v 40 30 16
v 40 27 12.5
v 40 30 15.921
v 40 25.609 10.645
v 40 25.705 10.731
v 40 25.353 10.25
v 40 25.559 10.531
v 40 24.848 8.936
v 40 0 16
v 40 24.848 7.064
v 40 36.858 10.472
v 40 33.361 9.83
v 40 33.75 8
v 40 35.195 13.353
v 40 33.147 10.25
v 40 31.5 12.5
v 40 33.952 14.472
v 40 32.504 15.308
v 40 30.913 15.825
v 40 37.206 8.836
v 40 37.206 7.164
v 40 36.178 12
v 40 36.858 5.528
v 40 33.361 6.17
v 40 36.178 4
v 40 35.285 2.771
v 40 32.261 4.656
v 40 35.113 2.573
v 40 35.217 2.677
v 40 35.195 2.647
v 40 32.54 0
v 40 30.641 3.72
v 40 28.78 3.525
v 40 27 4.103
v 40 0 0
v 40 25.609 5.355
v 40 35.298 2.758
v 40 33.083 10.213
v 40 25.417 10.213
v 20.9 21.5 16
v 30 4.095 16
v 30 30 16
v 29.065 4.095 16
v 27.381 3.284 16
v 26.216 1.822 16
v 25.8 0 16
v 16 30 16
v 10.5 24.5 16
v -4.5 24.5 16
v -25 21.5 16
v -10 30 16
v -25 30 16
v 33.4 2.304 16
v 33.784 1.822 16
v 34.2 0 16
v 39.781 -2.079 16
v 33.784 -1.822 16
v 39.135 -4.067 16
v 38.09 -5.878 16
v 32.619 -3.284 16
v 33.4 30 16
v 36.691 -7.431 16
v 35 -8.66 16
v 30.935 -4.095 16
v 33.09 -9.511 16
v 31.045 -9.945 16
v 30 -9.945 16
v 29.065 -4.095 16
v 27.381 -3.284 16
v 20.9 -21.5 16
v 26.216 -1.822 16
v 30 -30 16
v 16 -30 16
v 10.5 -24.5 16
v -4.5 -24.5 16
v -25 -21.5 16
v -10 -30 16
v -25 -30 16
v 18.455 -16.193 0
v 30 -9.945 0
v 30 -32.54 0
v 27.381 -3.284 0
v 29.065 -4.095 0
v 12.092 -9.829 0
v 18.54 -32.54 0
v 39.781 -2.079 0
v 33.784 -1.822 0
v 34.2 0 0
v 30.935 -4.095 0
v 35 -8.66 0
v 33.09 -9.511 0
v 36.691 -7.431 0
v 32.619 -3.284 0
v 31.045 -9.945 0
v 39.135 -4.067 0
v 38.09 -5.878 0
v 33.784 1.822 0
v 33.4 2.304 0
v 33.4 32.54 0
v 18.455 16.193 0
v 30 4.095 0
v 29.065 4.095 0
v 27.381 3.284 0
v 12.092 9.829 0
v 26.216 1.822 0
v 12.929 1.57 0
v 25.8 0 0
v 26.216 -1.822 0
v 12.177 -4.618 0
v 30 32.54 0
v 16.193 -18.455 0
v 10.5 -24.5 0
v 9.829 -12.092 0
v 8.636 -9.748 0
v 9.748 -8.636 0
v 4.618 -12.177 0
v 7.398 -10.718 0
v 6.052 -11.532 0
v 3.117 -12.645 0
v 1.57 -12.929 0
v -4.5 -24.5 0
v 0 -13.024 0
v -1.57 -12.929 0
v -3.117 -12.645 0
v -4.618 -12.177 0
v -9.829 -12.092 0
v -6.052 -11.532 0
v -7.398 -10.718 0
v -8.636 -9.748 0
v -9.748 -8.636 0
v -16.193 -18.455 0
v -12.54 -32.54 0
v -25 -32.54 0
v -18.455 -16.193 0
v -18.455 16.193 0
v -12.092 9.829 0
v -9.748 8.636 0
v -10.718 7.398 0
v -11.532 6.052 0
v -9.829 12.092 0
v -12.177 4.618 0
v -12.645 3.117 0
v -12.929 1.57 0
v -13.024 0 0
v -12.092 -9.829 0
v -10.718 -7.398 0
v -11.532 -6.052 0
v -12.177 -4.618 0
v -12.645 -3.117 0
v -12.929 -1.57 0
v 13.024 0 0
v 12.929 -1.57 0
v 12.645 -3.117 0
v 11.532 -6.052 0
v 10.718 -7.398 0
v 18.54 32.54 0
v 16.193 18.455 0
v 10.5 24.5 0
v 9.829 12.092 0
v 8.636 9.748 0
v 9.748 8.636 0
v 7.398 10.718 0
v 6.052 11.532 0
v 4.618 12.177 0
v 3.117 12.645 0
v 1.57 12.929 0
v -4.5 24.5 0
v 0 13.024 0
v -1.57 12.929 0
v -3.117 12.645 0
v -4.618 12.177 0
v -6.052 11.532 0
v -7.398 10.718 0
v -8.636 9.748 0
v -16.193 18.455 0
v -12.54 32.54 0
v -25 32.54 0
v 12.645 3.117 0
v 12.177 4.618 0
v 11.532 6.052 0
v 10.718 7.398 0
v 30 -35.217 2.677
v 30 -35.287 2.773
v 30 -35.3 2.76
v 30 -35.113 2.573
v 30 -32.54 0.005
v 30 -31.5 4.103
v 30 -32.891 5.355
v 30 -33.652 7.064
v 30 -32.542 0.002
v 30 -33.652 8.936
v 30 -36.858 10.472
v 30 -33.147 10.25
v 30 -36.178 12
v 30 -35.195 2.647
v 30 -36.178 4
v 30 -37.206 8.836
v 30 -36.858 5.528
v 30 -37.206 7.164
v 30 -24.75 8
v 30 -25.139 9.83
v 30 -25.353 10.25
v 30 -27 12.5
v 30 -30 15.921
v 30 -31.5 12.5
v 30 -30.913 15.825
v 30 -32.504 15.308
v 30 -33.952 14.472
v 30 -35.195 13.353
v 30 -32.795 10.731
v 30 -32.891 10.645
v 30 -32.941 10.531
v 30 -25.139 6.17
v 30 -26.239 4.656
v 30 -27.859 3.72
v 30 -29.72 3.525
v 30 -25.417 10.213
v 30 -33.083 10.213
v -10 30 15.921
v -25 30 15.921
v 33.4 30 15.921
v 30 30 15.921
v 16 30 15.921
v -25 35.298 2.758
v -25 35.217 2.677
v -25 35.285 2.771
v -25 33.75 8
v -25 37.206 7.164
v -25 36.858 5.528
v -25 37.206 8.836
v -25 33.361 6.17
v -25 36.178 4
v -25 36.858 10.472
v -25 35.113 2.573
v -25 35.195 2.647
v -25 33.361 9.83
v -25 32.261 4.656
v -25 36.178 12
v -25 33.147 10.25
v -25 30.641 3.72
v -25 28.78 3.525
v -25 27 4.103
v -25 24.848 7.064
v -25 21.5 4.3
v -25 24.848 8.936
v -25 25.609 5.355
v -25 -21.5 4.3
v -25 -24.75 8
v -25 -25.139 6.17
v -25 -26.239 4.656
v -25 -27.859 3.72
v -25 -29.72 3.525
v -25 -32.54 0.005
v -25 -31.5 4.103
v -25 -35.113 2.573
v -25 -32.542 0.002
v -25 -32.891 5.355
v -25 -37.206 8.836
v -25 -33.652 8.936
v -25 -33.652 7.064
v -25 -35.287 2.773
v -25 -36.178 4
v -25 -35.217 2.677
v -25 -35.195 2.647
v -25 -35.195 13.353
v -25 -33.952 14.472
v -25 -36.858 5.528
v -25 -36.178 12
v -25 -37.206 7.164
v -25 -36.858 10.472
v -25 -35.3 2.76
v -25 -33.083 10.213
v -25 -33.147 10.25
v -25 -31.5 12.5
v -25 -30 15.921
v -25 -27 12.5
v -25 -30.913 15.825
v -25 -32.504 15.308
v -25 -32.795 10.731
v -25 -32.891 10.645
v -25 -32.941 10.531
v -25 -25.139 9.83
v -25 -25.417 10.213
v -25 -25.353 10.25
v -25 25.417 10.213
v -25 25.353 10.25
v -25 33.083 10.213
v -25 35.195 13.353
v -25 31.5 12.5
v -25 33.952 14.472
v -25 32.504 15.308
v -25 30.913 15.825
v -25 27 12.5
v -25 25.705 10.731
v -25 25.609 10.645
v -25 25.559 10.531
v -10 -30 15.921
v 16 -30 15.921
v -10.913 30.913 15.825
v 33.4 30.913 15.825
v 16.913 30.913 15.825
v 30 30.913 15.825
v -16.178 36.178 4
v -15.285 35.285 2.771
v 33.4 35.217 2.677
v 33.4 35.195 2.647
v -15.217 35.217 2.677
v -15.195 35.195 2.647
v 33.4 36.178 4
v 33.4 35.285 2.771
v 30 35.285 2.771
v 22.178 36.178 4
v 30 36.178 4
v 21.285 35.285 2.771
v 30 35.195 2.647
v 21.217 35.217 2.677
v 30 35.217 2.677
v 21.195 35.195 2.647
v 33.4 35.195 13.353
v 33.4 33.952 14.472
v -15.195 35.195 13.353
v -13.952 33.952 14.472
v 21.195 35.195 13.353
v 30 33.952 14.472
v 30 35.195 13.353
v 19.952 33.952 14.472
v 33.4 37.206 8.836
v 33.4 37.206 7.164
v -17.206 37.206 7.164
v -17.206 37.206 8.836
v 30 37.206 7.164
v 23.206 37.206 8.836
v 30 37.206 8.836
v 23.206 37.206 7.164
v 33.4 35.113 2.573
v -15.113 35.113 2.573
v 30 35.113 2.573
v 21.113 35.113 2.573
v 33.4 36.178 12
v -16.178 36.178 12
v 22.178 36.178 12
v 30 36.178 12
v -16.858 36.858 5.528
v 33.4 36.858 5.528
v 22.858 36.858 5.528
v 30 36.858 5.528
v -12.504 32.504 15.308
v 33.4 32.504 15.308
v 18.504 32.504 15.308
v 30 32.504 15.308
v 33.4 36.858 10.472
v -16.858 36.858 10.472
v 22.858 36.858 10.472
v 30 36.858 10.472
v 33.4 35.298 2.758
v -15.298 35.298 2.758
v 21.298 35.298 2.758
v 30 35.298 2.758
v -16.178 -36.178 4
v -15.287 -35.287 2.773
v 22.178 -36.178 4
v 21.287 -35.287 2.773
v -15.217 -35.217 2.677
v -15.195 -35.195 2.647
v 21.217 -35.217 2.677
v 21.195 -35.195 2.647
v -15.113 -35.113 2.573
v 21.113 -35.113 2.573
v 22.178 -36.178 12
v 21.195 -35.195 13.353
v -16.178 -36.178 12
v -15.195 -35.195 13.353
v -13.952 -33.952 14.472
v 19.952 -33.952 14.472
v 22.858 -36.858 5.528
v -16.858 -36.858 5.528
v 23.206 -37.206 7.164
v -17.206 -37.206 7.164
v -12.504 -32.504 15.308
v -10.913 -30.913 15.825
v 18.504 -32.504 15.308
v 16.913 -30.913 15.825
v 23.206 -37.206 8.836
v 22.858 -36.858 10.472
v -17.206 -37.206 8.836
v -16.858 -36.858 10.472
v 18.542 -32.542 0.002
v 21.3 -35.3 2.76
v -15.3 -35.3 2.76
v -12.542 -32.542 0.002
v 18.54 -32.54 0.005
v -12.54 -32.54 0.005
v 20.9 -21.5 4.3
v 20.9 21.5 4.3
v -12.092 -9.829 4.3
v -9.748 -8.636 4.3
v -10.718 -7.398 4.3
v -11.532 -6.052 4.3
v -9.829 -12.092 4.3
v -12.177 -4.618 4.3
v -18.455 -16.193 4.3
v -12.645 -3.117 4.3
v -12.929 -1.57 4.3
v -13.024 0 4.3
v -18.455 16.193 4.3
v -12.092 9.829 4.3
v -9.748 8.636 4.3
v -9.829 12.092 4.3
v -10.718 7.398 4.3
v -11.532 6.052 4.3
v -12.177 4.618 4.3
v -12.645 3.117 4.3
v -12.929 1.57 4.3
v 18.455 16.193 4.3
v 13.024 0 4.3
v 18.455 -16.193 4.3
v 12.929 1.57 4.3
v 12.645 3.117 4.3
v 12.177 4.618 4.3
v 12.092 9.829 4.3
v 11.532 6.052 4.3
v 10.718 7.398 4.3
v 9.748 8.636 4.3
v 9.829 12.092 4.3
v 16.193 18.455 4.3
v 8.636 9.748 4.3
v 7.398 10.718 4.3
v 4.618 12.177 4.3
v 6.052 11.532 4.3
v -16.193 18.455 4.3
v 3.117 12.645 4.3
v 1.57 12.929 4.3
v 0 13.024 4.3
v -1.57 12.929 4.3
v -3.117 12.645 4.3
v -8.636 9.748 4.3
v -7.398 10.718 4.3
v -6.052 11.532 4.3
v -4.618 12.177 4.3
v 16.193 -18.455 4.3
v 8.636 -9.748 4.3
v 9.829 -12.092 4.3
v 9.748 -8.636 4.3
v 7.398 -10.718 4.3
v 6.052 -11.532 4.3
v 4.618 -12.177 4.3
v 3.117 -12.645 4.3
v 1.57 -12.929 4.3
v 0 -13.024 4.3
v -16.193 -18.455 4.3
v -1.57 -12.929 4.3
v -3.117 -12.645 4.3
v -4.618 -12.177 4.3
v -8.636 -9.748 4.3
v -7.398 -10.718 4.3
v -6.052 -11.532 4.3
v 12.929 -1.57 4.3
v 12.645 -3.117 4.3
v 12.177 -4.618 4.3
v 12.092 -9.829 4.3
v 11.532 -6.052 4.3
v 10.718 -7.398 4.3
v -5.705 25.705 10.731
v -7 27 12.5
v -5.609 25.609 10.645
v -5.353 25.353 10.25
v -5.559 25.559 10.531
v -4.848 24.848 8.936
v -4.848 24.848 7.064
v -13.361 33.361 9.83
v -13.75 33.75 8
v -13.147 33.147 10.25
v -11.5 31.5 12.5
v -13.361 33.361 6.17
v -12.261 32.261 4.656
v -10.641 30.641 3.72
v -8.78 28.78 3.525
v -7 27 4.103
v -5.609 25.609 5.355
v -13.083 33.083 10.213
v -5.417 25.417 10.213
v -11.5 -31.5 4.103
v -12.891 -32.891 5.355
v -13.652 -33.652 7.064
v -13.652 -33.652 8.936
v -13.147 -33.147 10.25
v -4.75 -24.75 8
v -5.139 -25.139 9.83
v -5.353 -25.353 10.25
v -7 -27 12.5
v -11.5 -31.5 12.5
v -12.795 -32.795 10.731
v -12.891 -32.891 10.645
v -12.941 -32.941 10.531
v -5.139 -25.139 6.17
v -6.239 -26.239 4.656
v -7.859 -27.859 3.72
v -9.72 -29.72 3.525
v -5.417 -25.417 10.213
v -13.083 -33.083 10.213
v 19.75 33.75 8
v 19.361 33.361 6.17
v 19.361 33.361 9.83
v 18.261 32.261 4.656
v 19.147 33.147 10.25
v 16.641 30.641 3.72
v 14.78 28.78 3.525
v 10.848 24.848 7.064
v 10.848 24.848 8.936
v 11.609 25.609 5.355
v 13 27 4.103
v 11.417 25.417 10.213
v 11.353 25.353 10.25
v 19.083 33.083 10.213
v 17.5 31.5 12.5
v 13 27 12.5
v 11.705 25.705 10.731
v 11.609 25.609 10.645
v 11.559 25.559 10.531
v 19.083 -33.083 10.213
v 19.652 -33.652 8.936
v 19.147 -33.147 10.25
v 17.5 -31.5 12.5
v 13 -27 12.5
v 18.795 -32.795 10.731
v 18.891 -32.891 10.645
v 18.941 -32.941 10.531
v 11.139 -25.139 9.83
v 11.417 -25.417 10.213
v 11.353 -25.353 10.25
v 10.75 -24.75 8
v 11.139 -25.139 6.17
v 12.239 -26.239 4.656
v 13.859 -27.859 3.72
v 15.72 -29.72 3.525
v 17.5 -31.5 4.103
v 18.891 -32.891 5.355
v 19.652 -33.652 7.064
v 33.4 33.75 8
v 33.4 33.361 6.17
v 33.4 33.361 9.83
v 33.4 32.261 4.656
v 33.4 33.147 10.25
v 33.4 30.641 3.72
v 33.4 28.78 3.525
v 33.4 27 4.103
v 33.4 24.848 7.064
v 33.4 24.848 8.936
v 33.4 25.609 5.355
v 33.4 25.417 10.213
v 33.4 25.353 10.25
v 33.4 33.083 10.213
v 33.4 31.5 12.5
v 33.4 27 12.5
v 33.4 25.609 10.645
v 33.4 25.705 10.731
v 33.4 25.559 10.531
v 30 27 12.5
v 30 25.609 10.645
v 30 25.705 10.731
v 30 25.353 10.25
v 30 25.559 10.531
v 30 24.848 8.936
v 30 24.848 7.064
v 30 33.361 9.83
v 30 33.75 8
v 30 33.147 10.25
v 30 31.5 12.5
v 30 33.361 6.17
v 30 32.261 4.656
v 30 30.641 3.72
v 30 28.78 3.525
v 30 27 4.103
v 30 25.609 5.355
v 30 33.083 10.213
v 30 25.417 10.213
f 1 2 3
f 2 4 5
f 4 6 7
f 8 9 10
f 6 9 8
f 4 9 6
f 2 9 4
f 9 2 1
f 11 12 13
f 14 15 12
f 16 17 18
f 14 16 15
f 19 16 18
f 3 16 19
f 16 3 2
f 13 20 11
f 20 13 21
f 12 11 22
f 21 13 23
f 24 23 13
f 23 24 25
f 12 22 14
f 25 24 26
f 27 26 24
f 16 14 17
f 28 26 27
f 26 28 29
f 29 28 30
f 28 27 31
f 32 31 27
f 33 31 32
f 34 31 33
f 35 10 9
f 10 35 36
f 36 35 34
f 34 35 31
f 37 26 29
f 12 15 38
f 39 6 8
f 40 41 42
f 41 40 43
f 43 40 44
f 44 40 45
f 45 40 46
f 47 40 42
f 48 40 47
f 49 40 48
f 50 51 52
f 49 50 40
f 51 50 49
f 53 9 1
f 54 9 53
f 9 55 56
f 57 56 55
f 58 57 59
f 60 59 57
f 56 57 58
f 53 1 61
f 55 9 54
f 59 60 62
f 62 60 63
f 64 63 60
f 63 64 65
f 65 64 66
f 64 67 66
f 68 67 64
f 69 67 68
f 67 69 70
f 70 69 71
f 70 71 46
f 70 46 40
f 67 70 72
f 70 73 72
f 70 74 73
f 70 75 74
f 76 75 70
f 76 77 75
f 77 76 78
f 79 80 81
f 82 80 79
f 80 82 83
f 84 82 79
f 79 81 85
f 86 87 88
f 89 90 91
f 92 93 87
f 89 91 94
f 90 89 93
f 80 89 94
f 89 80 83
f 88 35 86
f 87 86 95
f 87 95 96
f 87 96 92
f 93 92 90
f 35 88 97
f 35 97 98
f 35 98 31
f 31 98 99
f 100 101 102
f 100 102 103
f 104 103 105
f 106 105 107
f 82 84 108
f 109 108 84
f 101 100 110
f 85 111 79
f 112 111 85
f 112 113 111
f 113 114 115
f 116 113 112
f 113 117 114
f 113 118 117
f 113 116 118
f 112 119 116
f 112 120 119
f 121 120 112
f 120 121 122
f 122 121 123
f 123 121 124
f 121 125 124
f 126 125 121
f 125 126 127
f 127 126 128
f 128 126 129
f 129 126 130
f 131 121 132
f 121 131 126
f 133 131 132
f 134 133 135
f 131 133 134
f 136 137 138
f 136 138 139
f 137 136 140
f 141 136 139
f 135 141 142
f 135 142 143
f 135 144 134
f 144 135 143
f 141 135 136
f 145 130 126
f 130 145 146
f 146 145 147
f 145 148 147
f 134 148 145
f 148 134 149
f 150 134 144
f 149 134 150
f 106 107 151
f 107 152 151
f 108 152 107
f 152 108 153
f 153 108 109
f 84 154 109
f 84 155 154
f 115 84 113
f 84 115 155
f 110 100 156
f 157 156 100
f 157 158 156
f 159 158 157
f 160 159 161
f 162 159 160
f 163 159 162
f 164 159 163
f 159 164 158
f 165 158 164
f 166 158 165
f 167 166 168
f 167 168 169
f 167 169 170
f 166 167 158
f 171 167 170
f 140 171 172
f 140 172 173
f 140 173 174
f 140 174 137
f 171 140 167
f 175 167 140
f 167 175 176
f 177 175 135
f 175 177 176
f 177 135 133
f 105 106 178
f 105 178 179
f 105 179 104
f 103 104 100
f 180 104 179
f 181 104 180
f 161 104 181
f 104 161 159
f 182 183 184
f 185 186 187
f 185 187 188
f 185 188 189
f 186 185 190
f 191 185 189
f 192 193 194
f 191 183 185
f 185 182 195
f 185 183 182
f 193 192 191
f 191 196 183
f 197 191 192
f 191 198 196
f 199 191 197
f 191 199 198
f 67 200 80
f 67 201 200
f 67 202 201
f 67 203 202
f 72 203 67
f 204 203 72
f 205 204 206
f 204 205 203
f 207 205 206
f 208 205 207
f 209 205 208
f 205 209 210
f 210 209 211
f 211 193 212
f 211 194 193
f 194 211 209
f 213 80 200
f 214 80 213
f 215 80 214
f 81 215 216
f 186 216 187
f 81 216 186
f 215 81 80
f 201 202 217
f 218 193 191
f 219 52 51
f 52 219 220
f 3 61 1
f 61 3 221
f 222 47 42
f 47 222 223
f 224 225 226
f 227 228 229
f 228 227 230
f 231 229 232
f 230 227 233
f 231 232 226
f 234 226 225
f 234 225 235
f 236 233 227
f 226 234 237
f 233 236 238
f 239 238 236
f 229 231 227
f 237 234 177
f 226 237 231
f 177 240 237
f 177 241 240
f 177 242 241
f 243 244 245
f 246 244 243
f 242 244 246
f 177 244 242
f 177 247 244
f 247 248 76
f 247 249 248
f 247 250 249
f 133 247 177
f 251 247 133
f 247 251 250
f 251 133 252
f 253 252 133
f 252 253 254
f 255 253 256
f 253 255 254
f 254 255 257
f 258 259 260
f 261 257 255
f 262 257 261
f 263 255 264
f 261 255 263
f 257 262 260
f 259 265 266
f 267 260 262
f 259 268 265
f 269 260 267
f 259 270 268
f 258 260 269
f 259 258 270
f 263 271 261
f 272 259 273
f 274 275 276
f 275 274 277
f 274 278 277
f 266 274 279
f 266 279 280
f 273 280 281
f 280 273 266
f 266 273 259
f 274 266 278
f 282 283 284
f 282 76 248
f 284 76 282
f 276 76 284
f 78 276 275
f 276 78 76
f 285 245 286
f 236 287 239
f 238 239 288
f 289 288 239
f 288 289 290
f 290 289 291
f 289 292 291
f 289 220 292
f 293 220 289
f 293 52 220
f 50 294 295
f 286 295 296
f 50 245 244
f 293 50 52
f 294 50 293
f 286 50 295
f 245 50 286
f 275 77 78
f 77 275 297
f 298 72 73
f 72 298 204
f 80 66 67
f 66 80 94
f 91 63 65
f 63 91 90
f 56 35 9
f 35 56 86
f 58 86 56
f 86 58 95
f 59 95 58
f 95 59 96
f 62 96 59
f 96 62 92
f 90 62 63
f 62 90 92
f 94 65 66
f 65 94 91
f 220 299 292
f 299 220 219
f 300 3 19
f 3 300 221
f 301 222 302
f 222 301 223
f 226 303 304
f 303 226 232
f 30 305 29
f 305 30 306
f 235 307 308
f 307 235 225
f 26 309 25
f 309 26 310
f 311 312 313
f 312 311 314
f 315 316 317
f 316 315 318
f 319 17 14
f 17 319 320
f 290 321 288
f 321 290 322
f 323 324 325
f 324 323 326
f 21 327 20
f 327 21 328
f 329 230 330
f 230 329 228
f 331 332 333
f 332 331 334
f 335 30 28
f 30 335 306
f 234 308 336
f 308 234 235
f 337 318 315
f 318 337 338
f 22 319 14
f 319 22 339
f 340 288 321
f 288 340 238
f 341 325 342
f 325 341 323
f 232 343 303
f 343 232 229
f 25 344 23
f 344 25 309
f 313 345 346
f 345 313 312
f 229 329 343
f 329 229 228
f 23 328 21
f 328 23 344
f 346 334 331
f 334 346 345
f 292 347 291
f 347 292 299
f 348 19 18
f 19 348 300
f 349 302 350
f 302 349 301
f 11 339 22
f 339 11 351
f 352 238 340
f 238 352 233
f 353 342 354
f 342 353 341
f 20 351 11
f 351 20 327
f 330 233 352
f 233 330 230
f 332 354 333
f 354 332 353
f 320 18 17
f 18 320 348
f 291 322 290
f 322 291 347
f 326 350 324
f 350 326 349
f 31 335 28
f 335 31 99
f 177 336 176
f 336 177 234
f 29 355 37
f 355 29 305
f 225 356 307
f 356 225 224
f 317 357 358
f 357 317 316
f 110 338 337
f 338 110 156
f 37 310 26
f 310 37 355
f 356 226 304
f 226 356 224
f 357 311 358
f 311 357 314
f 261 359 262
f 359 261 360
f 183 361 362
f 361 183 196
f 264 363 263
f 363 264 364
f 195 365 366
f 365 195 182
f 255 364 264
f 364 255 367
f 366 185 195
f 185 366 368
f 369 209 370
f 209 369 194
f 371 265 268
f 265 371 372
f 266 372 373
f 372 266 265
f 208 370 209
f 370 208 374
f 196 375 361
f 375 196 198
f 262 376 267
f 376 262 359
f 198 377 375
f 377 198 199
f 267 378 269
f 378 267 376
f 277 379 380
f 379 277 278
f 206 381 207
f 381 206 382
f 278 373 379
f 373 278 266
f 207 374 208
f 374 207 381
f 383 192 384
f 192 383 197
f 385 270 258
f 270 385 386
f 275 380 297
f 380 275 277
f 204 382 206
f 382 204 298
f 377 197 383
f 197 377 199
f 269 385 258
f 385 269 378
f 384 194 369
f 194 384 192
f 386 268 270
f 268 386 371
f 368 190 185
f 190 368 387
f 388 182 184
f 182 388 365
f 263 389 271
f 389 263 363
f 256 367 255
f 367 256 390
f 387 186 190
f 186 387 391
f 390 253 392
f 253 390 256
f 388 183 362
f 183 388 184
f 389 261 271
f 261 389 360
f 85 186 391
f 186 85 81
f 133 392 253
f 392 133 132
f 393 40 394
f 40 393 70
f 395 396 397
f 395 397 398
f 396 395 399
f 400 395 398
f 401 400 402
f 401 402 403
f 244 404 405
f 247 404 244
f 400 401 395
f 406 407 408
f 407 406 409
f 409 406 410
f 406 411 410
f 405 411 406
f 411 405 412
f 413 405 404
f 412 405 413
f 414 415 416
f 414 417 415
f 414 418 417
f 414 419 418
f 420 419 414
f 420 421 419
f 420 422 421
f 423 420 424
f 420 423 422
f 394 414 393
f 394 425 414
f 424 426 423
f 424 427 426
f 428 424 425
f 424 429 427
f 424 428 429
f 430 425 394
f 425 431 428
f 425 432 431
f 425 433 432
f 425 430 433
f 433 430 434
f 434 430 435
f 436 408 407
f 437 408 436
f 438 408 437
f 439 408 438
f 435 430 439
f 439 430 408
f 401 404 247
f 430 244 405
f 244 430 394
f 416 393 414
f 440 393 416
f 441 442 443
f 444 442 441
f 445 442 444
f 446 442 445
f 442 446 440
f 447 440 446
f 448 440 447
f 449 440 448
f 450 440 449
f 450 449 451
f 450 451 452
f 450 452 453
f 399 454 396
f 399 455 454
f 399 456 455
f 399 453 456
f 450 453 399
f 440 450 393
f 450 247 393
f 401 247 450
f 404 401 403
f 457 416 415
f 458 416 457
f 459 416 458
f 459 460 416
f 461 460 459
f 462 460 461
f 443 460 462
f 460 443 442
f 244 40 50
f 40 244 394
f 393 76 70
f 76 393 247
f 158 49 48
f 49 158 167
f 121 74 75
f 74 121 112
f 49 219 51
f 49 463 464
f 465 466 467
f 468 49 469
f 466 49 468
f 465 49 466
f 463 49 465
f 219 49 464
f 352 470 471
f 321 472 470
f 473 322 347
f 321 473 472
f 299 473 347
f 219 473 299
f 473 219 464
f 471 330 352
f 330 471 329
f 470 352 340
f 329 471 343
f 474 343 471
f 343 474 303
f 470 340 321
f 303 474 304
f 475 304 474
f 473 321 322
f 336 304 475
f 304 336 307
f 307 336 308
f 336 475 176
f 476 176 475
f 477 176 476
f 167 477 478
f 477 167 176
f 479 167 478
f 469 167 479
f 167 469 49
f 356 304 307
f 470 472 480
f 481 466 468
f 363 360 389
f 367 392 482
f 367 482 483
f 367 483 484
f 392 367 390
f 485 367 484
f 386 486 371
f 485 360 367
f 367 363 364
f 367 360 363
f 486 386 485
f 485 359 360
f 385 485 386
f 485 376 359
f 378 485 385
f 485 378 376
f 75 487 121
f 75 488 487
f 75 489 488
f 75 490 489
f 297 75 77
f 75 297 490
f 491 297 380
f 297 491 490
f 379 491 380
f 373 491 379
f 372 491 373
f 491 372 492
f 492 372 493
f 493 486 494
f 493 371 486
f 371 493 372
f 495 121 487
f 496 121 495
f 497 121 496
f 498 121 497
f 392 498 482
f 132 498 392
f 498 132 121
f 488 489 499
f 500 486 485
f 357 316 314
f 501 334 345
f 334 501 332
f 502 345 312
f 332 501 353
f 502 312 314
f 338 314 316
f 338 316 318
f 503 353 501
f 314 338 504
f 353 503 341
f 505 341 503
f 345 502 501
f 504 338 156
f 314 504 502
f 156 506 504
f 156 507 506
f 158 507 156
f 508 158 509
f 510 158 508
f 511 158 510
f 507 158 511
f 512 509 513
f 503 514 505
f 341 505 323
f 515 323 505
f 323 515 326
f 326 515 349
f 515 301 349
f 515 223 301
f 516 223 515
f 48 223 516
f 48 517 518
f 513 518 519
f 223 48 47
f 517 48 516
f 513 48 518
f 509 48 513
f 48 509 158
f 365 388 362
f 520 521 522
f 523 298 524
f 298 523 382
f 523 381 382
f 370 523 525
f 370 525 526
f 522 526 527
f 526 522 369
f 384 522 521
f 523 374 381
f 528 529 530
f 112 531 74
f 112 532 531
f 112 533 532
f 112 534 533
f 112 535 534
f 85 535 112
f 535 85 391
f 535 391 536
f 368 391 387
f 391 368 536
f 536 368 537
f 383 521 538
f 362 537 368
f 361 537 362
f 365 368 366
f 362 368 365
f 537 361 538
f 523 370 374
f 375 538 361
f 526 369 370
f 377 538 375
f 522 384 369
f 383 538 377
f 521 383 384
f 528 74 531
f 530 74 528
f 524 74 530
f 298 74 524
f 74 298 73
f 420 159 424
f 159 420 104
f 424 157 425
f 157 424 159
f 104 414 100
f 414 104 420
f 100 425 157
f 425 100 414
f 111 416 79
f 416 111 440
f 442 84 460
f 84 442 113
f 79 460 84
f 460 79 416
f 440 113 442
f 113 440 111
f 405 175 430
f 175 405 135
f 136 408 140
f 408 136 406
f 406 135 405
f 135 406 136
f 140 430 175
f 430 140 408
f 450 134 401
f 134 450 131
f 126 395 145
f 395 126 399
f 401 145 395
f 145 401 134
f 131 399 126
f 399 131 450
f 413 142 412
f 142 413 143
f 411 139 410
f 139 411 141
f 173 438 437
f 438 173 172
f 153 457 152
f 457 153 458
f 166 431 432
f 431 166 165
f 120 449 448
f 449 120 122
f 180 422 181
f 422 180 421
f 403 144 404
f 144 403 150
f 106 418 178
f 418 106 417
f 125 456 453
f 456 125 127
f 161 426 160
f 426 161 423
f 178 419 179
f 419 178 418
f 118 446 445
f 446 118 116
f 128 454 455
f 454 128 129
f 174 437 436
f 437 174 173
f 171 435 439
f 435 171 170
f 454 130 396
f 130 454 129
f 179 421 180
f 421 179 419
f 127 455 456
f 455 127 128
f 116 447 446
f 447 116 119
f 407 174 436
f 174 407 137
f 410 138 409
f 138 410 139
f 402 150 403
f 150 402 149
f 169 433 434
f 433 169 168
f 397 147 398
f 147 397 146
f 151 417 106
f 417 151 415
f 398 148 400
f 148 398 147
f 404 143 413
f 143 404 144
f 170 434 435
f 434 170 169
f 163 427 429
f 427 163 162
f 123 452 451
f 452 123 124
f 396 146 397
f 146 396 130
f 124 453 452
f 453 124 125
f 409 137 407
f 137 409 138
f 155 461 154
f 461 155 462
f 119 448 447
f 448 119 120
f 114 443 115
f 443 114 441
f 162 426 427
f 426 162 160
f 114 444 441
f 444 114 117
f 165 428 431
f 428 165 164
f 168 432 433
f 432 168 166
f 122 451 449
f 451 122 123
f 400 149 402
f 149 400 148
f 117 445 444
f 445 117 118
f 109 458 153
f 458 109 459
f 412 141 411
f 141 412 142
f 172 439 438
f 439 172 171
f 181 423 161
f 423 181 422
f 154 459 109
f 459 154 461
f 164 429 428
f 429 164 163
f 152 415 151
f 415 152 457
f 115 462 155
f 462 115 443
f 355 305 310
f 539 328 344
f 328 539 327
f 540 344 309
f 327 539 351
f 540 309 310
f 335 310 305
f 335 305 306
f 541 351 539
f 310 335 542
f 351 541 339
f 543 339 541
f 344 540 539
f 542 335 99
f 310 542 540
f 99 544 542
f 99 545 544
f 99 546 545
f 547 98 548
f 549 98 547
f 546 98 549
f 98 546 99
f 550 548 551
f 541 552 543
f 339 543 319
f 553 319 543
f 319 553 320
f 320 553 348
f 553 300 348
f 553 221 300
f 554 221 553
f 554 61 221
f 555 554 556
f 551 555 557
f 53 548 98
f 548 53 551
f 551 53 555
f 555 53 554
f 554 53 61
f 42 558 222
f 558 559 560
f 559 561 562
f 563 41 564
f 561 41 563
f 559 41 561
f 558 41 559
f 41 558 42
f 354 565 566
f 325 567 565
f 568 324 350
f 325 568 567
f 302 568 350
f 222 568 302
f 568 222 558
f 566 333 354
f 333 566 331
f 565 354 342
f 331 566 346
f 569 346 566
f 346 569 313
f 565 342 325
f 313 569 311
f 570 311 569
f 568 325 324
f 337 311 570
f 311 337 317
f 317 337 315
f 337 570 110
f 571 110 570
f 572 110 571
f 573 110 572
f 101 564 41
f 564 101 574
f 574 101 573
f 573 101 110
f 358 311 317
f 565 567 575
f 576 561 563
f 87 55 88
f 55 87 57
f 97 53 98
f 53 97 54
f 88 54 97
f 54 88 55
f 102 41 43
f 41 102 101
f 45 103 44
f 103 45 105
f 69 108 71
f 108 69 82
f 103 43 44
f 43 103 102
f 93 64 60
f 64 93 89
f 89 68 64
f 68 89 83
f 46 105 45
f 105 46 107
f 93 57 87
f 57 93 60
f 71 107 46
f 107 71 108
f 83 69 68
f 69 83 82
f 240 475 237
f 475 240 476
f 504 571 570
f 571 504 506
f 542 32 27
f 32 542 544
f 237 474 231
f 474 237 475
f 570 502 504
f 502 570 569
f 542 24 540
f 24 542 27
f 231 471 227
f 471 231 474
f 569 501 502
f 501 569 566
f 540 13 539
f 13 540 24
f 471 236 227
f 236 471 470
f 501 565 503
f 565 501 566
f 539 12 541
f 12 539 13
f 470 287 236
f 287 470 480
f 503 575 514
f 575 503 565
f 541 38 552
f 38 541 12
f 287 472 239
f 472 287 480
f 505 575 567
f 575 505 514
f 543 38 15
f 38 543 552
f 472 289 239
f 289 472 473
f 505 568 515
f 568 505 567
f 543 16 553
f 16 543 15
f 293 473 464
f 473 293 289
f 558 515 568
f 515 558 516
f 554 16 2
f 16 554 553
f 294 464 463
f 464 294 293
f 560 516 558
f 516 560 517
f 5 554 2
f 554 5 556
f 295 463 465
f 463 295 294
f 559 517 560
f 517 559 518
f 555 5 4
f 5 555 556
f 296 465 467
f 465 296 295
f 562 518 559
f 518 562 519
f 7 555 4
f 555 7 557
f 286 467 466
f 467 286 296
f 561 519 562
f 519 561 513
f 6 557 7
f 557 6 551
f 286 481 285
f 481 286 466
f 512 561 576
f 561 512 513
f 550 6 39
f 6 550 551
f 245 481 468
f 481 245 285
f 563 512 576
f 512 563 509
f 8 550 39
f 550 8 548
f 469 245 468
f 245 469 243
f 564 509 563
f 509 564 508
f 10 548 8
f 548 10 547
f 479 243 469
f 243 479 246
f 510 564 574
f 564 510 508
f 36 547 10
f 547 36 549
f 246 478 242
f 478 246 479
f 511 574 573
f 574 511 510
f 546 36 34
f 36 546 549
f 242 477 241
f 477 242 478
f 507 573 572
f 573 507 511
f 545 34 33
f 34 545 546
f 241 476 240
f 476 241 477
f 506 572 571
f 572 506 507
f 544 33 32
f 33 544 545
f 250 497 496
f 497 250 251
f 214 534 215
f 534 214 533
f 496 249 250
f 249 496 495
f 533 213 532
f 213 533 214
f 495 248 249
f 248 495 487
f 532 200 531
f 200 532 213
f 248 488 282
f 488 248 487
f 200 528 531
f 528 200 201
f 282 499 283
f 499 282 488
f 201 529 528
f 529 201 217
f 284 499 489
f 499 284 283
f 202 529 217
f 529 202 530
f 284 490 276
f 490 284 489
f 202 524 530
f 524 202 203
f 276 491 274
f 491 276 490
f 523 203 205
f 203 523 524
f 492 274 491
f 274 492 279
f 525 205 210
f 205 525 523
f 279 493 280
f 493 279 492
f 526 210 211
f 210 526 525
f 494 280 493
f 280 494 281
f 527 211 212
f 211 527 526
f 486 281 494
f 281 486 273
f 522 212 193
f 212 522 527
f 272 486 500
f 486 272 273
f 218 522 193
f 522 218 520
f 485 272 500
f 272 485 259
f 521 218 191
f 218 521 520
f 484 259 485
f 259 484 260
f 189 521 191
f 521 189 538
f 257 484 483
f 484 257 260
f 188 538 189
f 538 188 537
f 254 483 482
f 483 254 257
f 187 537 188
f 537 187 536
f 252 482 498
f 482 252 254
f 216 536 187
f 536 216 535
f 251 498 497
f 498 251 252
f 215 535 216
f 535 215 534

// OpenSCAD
// file: functions.scad
// PRUSA Mendel  
// Functions used in many files
// GNU GPL v3
// Josef Průša
// josefprusa@me.com
// prusadjs.cz
// http://www.reprap.org/wiki/Prusa_Mendel
// http://github.com/prusajr/PrusaMendel


module nut(d,h,horizontal=true) {
	cornerdiameter = (d / 2) / cos (180 / 6);
	cylinder(h = h, r = cornerdiameter, $fn = 6);
	if(horizontal) {
		for(i = [1:6]) {
			rotate([0,0,60*i]) translate([-cornerdiameter-0.2,0,0]) rotate([0,0,-45]) cube(size = [2,2,h]);
		}
	}
}

// Based on nophead research
module polyhole(d,h) {
	n = max(round(2 * d),3);
	rotate([0,0,180])
		cylinder(h = h, r = (d / 2) / cos (180 / n), $fn = n);
}

module roundcorner(diameter) {
	difference() {
		cube(size = [diameter,diameter,99], center = false);
		translate(v = [diameter, diameter, 0]) cylinder(h = 100, r=diameter, center=true);
	}
}
// file: metric.scad
// PRUSA Mendel  
// Default metric sizes
// GNU GPL v2
// Josef Průša
// josefprusa@me.com
// prusadjs.cz
// http://www.reprap.org/wiki/Prusa_Mendel
// http://github.com/prusajr/PrusaMendel

// DONT CHANGE THIS FILE! ALTER VALUES IN CONFIGURATION.SCAD INSTEAD

// RODS

threaded_rod_diameter = 8.2;
threaded_rod_diameter_horizontal = 8.2;
smooth_bar_diameter = 8;
smooth_bar_diameter_horizontal = 8.5;

// Nuts and bolts
// Nut diameters are flat to flat

m8_diameter = 9;
m8_nut_diameter = 16.4;
m8_nut_thickness = 6.5;

m4_diameter = 4.5;
m4_nut_diameter = 9;
m4_nut_thickness = 3.2;

m3_diameter = 3.6;
m3_nut_diameter = 6.1;
m3_nut_thickness = 2.4;

// Bushing holder

bushing_core_diameter = smooth_bar_diameter;
bushing_material_thickness = 1;

// Motors

motor_shaft = 5.5;
// file: configuration.scad
// PRUSA Mendel  
// Configuration file
// GNU GPL v3
// Josef Průša
// josefprusa@me.com
// prusadjs.cz
// http://www.reprap.org/wiki/Prusa_Mendel
// http://github.com/prusajr/PrusaMendel

// PLEASE SELECT ONE OF THE CONFIGURATIONS BELOW
// BY UN-COMMENTING IT

// Uncomment for metric settings
// METRIC METRIC METRIC METRIC METRIC METRIC METRIC METRIC 

include <metric.scad>;

// CUSTOM CUSTOM CUSTOM CUSTOM CUSTOM CUSTOM CUSTOM CUSTOM CUSTOM

thin_wall = 3;


// Linear bearing version
linear = true;
// set false for LM-8UU, true for LM-E-8UU (ignore if linear is set to false)
lme8uu = false;



// CHANGE ONLY THE STUFF YOU KNOW
// IT WILL REPLACE DEFAULT SETTING

// RODS

// threaded_rod_diameter = 0;
// threaded_rod_diameter_horizontal = 0;
// smooth_bar_diameter = 0;
// smooth_bar_diameter_horizontal = 0;

// Nuts and bolts

// m8_diameter = 0;
// m8_nut_diameter = 0;

// m4_diameter = 0;
// m4_nut_diameter = 0;

m3_diameter = 3.5;
// m3_nut_diameter = 0;

// Bushing holder

// bushing_core_diameter = smooth_bar_diameter;
// bushing_material_thickness = 0;


///counted stuff
m3_nut_diameter_bigger = ((m3_nut_diameter  / 2) / cos (180 / 6))*2;

// functions 
include <functions.scad>
// main file
// PRUSA Mendel  
// Z motor mount with barclamp
// Used for mounting Z motors & barclamp
// GNU GPL v2
//ElMatador
//used Z-motor-mount.scad by Josef Prusa
// Josef Průša
// josefprusa@me.com
// http://www.reprap.org/wiki/Prusa_Mendel

include <configuration.scad>

/**
 * @id z-motor-mount
 * @name Z motor mount
 * @category Printed
 * @using 2 m3x25xhex
 * @using 2 m3nut
 * @using 2 m3washer
 * @using 4 m8nut
 * @using 4 m8washer
 * @using 1 rod-clamp
 */

module teardrop (r=8,h=20){
rotate([0,0,90])
linear_extrude(height=h)
{
circle(r=r);
polygon(points=[[0,0],[r*cos(30),r*sin(30)],[0.5*r,r],[-0.5*r,r],[-r*cos(30),r*sin(30)]],
paths=[[0,1,2,3,4]]);
}
}
 
module zmotormount(){
difference(){
union(){
translate(v=[30,0,-8]) cube(size = [10,30,16]);
translate(v=[2.5,0,0]) cube(size = [55,60,16], center = true);
translate(v=[2.5,0,-4]) cube(size = [55,74.5-16,8], center = true);
translate(v=[30,0,-8]) cylinder(h = 16, r=10);
translate(v=[-25,29.25,0]) rotate(a=[0,90,0]) cylinder(h = 65, r=8, $fn=30);
translate(v=[-25,32.54,-8]) rotate([45,0,0]) cube(size = [65,3.9,5]);			//included to make 45 degree
translate(v=[-25,28.64,-8]) cube(size = [65,3.9,5]);							//base extension
translate(v=[-25,-29.25,0]) rotate(a=[0,90,0]) cylinder(h = 55, r=8, $fn=30);
translate(v=[-25,-35.30,-5.24]) rotate([-45,0,0]) cube(size = [55,3.9,5]);		//included to make 45 degree
translate(v=[-25,-32.54,-8]) cube(size = [55,3.9,5]);							//base extension
}
translate(v=[-2.1,0,2.8]) cube(size = [46,43,13], center = true);

// reducing the material
translate(v=[10.5-7.5,34.5,-4]) cube(size = [15,20,30], center = true);
translate(v=[10.5-7.5,-34.5,-4]) cube(size = [15,20,30], center = true);
translate(v=[-10,0,0]) translate(v=[5.5,24.5,-10]) rotate(a=[0,0,45]) cube(size = [20,20,30]);
translate(v=[-10,0,0]) translate(v=[5.5,-24.5,-10]) rotate(a=[0,0,225]) cube(size = [20,20,30]);
translate(v=[5,0,0]) translate(v=[5.5,24.5,-10]) rotate(a=[0,0,45]) cube(size = [20,20,30]);
translate(v=[5,0,0]) translate(v=[5.5,-24.5,-10]) rotate(a=[0,0,225]) cube(size = [20,20,30]);

// Nema 17
rotate ([0,0,45]) translate([20,0,0]) cube(size = [9,3.2,25], center = true);
rotate ([0,0,-45]) translate([20,0,0]) cube(size = [9,3.2,25], center = true);
rotate ([0,0,135]) translate([20,0,0]) cube(size = [9,3.2,25], center = true);
rotate ([0,0,-135]) translate([20,0,0]) cube(size = [9,3.2,25], center = true);
translate(v=[0,0,-10])polyhole(26,20);

translate(v=[31.7,20,0])cube(size=[3.4,40,20], center = true);
translate(v=[30,0,-10]) cylinder(h = 20, r=4.2);
translate(v=[-26,29.25,0]) rotate(a=[0,90,0]) teardrop(h = 70, r=m8_diameter/2);	//previously cylinders
translate(v=[-26,-29.25,0]) rotate(a=[0,90,0]) teardrop(h = 58, r=m8_diameter/2);	//previously cylinders

}
}
translate(v=[0,0,8]) rotate ([0,0,0]) zmotormount();
